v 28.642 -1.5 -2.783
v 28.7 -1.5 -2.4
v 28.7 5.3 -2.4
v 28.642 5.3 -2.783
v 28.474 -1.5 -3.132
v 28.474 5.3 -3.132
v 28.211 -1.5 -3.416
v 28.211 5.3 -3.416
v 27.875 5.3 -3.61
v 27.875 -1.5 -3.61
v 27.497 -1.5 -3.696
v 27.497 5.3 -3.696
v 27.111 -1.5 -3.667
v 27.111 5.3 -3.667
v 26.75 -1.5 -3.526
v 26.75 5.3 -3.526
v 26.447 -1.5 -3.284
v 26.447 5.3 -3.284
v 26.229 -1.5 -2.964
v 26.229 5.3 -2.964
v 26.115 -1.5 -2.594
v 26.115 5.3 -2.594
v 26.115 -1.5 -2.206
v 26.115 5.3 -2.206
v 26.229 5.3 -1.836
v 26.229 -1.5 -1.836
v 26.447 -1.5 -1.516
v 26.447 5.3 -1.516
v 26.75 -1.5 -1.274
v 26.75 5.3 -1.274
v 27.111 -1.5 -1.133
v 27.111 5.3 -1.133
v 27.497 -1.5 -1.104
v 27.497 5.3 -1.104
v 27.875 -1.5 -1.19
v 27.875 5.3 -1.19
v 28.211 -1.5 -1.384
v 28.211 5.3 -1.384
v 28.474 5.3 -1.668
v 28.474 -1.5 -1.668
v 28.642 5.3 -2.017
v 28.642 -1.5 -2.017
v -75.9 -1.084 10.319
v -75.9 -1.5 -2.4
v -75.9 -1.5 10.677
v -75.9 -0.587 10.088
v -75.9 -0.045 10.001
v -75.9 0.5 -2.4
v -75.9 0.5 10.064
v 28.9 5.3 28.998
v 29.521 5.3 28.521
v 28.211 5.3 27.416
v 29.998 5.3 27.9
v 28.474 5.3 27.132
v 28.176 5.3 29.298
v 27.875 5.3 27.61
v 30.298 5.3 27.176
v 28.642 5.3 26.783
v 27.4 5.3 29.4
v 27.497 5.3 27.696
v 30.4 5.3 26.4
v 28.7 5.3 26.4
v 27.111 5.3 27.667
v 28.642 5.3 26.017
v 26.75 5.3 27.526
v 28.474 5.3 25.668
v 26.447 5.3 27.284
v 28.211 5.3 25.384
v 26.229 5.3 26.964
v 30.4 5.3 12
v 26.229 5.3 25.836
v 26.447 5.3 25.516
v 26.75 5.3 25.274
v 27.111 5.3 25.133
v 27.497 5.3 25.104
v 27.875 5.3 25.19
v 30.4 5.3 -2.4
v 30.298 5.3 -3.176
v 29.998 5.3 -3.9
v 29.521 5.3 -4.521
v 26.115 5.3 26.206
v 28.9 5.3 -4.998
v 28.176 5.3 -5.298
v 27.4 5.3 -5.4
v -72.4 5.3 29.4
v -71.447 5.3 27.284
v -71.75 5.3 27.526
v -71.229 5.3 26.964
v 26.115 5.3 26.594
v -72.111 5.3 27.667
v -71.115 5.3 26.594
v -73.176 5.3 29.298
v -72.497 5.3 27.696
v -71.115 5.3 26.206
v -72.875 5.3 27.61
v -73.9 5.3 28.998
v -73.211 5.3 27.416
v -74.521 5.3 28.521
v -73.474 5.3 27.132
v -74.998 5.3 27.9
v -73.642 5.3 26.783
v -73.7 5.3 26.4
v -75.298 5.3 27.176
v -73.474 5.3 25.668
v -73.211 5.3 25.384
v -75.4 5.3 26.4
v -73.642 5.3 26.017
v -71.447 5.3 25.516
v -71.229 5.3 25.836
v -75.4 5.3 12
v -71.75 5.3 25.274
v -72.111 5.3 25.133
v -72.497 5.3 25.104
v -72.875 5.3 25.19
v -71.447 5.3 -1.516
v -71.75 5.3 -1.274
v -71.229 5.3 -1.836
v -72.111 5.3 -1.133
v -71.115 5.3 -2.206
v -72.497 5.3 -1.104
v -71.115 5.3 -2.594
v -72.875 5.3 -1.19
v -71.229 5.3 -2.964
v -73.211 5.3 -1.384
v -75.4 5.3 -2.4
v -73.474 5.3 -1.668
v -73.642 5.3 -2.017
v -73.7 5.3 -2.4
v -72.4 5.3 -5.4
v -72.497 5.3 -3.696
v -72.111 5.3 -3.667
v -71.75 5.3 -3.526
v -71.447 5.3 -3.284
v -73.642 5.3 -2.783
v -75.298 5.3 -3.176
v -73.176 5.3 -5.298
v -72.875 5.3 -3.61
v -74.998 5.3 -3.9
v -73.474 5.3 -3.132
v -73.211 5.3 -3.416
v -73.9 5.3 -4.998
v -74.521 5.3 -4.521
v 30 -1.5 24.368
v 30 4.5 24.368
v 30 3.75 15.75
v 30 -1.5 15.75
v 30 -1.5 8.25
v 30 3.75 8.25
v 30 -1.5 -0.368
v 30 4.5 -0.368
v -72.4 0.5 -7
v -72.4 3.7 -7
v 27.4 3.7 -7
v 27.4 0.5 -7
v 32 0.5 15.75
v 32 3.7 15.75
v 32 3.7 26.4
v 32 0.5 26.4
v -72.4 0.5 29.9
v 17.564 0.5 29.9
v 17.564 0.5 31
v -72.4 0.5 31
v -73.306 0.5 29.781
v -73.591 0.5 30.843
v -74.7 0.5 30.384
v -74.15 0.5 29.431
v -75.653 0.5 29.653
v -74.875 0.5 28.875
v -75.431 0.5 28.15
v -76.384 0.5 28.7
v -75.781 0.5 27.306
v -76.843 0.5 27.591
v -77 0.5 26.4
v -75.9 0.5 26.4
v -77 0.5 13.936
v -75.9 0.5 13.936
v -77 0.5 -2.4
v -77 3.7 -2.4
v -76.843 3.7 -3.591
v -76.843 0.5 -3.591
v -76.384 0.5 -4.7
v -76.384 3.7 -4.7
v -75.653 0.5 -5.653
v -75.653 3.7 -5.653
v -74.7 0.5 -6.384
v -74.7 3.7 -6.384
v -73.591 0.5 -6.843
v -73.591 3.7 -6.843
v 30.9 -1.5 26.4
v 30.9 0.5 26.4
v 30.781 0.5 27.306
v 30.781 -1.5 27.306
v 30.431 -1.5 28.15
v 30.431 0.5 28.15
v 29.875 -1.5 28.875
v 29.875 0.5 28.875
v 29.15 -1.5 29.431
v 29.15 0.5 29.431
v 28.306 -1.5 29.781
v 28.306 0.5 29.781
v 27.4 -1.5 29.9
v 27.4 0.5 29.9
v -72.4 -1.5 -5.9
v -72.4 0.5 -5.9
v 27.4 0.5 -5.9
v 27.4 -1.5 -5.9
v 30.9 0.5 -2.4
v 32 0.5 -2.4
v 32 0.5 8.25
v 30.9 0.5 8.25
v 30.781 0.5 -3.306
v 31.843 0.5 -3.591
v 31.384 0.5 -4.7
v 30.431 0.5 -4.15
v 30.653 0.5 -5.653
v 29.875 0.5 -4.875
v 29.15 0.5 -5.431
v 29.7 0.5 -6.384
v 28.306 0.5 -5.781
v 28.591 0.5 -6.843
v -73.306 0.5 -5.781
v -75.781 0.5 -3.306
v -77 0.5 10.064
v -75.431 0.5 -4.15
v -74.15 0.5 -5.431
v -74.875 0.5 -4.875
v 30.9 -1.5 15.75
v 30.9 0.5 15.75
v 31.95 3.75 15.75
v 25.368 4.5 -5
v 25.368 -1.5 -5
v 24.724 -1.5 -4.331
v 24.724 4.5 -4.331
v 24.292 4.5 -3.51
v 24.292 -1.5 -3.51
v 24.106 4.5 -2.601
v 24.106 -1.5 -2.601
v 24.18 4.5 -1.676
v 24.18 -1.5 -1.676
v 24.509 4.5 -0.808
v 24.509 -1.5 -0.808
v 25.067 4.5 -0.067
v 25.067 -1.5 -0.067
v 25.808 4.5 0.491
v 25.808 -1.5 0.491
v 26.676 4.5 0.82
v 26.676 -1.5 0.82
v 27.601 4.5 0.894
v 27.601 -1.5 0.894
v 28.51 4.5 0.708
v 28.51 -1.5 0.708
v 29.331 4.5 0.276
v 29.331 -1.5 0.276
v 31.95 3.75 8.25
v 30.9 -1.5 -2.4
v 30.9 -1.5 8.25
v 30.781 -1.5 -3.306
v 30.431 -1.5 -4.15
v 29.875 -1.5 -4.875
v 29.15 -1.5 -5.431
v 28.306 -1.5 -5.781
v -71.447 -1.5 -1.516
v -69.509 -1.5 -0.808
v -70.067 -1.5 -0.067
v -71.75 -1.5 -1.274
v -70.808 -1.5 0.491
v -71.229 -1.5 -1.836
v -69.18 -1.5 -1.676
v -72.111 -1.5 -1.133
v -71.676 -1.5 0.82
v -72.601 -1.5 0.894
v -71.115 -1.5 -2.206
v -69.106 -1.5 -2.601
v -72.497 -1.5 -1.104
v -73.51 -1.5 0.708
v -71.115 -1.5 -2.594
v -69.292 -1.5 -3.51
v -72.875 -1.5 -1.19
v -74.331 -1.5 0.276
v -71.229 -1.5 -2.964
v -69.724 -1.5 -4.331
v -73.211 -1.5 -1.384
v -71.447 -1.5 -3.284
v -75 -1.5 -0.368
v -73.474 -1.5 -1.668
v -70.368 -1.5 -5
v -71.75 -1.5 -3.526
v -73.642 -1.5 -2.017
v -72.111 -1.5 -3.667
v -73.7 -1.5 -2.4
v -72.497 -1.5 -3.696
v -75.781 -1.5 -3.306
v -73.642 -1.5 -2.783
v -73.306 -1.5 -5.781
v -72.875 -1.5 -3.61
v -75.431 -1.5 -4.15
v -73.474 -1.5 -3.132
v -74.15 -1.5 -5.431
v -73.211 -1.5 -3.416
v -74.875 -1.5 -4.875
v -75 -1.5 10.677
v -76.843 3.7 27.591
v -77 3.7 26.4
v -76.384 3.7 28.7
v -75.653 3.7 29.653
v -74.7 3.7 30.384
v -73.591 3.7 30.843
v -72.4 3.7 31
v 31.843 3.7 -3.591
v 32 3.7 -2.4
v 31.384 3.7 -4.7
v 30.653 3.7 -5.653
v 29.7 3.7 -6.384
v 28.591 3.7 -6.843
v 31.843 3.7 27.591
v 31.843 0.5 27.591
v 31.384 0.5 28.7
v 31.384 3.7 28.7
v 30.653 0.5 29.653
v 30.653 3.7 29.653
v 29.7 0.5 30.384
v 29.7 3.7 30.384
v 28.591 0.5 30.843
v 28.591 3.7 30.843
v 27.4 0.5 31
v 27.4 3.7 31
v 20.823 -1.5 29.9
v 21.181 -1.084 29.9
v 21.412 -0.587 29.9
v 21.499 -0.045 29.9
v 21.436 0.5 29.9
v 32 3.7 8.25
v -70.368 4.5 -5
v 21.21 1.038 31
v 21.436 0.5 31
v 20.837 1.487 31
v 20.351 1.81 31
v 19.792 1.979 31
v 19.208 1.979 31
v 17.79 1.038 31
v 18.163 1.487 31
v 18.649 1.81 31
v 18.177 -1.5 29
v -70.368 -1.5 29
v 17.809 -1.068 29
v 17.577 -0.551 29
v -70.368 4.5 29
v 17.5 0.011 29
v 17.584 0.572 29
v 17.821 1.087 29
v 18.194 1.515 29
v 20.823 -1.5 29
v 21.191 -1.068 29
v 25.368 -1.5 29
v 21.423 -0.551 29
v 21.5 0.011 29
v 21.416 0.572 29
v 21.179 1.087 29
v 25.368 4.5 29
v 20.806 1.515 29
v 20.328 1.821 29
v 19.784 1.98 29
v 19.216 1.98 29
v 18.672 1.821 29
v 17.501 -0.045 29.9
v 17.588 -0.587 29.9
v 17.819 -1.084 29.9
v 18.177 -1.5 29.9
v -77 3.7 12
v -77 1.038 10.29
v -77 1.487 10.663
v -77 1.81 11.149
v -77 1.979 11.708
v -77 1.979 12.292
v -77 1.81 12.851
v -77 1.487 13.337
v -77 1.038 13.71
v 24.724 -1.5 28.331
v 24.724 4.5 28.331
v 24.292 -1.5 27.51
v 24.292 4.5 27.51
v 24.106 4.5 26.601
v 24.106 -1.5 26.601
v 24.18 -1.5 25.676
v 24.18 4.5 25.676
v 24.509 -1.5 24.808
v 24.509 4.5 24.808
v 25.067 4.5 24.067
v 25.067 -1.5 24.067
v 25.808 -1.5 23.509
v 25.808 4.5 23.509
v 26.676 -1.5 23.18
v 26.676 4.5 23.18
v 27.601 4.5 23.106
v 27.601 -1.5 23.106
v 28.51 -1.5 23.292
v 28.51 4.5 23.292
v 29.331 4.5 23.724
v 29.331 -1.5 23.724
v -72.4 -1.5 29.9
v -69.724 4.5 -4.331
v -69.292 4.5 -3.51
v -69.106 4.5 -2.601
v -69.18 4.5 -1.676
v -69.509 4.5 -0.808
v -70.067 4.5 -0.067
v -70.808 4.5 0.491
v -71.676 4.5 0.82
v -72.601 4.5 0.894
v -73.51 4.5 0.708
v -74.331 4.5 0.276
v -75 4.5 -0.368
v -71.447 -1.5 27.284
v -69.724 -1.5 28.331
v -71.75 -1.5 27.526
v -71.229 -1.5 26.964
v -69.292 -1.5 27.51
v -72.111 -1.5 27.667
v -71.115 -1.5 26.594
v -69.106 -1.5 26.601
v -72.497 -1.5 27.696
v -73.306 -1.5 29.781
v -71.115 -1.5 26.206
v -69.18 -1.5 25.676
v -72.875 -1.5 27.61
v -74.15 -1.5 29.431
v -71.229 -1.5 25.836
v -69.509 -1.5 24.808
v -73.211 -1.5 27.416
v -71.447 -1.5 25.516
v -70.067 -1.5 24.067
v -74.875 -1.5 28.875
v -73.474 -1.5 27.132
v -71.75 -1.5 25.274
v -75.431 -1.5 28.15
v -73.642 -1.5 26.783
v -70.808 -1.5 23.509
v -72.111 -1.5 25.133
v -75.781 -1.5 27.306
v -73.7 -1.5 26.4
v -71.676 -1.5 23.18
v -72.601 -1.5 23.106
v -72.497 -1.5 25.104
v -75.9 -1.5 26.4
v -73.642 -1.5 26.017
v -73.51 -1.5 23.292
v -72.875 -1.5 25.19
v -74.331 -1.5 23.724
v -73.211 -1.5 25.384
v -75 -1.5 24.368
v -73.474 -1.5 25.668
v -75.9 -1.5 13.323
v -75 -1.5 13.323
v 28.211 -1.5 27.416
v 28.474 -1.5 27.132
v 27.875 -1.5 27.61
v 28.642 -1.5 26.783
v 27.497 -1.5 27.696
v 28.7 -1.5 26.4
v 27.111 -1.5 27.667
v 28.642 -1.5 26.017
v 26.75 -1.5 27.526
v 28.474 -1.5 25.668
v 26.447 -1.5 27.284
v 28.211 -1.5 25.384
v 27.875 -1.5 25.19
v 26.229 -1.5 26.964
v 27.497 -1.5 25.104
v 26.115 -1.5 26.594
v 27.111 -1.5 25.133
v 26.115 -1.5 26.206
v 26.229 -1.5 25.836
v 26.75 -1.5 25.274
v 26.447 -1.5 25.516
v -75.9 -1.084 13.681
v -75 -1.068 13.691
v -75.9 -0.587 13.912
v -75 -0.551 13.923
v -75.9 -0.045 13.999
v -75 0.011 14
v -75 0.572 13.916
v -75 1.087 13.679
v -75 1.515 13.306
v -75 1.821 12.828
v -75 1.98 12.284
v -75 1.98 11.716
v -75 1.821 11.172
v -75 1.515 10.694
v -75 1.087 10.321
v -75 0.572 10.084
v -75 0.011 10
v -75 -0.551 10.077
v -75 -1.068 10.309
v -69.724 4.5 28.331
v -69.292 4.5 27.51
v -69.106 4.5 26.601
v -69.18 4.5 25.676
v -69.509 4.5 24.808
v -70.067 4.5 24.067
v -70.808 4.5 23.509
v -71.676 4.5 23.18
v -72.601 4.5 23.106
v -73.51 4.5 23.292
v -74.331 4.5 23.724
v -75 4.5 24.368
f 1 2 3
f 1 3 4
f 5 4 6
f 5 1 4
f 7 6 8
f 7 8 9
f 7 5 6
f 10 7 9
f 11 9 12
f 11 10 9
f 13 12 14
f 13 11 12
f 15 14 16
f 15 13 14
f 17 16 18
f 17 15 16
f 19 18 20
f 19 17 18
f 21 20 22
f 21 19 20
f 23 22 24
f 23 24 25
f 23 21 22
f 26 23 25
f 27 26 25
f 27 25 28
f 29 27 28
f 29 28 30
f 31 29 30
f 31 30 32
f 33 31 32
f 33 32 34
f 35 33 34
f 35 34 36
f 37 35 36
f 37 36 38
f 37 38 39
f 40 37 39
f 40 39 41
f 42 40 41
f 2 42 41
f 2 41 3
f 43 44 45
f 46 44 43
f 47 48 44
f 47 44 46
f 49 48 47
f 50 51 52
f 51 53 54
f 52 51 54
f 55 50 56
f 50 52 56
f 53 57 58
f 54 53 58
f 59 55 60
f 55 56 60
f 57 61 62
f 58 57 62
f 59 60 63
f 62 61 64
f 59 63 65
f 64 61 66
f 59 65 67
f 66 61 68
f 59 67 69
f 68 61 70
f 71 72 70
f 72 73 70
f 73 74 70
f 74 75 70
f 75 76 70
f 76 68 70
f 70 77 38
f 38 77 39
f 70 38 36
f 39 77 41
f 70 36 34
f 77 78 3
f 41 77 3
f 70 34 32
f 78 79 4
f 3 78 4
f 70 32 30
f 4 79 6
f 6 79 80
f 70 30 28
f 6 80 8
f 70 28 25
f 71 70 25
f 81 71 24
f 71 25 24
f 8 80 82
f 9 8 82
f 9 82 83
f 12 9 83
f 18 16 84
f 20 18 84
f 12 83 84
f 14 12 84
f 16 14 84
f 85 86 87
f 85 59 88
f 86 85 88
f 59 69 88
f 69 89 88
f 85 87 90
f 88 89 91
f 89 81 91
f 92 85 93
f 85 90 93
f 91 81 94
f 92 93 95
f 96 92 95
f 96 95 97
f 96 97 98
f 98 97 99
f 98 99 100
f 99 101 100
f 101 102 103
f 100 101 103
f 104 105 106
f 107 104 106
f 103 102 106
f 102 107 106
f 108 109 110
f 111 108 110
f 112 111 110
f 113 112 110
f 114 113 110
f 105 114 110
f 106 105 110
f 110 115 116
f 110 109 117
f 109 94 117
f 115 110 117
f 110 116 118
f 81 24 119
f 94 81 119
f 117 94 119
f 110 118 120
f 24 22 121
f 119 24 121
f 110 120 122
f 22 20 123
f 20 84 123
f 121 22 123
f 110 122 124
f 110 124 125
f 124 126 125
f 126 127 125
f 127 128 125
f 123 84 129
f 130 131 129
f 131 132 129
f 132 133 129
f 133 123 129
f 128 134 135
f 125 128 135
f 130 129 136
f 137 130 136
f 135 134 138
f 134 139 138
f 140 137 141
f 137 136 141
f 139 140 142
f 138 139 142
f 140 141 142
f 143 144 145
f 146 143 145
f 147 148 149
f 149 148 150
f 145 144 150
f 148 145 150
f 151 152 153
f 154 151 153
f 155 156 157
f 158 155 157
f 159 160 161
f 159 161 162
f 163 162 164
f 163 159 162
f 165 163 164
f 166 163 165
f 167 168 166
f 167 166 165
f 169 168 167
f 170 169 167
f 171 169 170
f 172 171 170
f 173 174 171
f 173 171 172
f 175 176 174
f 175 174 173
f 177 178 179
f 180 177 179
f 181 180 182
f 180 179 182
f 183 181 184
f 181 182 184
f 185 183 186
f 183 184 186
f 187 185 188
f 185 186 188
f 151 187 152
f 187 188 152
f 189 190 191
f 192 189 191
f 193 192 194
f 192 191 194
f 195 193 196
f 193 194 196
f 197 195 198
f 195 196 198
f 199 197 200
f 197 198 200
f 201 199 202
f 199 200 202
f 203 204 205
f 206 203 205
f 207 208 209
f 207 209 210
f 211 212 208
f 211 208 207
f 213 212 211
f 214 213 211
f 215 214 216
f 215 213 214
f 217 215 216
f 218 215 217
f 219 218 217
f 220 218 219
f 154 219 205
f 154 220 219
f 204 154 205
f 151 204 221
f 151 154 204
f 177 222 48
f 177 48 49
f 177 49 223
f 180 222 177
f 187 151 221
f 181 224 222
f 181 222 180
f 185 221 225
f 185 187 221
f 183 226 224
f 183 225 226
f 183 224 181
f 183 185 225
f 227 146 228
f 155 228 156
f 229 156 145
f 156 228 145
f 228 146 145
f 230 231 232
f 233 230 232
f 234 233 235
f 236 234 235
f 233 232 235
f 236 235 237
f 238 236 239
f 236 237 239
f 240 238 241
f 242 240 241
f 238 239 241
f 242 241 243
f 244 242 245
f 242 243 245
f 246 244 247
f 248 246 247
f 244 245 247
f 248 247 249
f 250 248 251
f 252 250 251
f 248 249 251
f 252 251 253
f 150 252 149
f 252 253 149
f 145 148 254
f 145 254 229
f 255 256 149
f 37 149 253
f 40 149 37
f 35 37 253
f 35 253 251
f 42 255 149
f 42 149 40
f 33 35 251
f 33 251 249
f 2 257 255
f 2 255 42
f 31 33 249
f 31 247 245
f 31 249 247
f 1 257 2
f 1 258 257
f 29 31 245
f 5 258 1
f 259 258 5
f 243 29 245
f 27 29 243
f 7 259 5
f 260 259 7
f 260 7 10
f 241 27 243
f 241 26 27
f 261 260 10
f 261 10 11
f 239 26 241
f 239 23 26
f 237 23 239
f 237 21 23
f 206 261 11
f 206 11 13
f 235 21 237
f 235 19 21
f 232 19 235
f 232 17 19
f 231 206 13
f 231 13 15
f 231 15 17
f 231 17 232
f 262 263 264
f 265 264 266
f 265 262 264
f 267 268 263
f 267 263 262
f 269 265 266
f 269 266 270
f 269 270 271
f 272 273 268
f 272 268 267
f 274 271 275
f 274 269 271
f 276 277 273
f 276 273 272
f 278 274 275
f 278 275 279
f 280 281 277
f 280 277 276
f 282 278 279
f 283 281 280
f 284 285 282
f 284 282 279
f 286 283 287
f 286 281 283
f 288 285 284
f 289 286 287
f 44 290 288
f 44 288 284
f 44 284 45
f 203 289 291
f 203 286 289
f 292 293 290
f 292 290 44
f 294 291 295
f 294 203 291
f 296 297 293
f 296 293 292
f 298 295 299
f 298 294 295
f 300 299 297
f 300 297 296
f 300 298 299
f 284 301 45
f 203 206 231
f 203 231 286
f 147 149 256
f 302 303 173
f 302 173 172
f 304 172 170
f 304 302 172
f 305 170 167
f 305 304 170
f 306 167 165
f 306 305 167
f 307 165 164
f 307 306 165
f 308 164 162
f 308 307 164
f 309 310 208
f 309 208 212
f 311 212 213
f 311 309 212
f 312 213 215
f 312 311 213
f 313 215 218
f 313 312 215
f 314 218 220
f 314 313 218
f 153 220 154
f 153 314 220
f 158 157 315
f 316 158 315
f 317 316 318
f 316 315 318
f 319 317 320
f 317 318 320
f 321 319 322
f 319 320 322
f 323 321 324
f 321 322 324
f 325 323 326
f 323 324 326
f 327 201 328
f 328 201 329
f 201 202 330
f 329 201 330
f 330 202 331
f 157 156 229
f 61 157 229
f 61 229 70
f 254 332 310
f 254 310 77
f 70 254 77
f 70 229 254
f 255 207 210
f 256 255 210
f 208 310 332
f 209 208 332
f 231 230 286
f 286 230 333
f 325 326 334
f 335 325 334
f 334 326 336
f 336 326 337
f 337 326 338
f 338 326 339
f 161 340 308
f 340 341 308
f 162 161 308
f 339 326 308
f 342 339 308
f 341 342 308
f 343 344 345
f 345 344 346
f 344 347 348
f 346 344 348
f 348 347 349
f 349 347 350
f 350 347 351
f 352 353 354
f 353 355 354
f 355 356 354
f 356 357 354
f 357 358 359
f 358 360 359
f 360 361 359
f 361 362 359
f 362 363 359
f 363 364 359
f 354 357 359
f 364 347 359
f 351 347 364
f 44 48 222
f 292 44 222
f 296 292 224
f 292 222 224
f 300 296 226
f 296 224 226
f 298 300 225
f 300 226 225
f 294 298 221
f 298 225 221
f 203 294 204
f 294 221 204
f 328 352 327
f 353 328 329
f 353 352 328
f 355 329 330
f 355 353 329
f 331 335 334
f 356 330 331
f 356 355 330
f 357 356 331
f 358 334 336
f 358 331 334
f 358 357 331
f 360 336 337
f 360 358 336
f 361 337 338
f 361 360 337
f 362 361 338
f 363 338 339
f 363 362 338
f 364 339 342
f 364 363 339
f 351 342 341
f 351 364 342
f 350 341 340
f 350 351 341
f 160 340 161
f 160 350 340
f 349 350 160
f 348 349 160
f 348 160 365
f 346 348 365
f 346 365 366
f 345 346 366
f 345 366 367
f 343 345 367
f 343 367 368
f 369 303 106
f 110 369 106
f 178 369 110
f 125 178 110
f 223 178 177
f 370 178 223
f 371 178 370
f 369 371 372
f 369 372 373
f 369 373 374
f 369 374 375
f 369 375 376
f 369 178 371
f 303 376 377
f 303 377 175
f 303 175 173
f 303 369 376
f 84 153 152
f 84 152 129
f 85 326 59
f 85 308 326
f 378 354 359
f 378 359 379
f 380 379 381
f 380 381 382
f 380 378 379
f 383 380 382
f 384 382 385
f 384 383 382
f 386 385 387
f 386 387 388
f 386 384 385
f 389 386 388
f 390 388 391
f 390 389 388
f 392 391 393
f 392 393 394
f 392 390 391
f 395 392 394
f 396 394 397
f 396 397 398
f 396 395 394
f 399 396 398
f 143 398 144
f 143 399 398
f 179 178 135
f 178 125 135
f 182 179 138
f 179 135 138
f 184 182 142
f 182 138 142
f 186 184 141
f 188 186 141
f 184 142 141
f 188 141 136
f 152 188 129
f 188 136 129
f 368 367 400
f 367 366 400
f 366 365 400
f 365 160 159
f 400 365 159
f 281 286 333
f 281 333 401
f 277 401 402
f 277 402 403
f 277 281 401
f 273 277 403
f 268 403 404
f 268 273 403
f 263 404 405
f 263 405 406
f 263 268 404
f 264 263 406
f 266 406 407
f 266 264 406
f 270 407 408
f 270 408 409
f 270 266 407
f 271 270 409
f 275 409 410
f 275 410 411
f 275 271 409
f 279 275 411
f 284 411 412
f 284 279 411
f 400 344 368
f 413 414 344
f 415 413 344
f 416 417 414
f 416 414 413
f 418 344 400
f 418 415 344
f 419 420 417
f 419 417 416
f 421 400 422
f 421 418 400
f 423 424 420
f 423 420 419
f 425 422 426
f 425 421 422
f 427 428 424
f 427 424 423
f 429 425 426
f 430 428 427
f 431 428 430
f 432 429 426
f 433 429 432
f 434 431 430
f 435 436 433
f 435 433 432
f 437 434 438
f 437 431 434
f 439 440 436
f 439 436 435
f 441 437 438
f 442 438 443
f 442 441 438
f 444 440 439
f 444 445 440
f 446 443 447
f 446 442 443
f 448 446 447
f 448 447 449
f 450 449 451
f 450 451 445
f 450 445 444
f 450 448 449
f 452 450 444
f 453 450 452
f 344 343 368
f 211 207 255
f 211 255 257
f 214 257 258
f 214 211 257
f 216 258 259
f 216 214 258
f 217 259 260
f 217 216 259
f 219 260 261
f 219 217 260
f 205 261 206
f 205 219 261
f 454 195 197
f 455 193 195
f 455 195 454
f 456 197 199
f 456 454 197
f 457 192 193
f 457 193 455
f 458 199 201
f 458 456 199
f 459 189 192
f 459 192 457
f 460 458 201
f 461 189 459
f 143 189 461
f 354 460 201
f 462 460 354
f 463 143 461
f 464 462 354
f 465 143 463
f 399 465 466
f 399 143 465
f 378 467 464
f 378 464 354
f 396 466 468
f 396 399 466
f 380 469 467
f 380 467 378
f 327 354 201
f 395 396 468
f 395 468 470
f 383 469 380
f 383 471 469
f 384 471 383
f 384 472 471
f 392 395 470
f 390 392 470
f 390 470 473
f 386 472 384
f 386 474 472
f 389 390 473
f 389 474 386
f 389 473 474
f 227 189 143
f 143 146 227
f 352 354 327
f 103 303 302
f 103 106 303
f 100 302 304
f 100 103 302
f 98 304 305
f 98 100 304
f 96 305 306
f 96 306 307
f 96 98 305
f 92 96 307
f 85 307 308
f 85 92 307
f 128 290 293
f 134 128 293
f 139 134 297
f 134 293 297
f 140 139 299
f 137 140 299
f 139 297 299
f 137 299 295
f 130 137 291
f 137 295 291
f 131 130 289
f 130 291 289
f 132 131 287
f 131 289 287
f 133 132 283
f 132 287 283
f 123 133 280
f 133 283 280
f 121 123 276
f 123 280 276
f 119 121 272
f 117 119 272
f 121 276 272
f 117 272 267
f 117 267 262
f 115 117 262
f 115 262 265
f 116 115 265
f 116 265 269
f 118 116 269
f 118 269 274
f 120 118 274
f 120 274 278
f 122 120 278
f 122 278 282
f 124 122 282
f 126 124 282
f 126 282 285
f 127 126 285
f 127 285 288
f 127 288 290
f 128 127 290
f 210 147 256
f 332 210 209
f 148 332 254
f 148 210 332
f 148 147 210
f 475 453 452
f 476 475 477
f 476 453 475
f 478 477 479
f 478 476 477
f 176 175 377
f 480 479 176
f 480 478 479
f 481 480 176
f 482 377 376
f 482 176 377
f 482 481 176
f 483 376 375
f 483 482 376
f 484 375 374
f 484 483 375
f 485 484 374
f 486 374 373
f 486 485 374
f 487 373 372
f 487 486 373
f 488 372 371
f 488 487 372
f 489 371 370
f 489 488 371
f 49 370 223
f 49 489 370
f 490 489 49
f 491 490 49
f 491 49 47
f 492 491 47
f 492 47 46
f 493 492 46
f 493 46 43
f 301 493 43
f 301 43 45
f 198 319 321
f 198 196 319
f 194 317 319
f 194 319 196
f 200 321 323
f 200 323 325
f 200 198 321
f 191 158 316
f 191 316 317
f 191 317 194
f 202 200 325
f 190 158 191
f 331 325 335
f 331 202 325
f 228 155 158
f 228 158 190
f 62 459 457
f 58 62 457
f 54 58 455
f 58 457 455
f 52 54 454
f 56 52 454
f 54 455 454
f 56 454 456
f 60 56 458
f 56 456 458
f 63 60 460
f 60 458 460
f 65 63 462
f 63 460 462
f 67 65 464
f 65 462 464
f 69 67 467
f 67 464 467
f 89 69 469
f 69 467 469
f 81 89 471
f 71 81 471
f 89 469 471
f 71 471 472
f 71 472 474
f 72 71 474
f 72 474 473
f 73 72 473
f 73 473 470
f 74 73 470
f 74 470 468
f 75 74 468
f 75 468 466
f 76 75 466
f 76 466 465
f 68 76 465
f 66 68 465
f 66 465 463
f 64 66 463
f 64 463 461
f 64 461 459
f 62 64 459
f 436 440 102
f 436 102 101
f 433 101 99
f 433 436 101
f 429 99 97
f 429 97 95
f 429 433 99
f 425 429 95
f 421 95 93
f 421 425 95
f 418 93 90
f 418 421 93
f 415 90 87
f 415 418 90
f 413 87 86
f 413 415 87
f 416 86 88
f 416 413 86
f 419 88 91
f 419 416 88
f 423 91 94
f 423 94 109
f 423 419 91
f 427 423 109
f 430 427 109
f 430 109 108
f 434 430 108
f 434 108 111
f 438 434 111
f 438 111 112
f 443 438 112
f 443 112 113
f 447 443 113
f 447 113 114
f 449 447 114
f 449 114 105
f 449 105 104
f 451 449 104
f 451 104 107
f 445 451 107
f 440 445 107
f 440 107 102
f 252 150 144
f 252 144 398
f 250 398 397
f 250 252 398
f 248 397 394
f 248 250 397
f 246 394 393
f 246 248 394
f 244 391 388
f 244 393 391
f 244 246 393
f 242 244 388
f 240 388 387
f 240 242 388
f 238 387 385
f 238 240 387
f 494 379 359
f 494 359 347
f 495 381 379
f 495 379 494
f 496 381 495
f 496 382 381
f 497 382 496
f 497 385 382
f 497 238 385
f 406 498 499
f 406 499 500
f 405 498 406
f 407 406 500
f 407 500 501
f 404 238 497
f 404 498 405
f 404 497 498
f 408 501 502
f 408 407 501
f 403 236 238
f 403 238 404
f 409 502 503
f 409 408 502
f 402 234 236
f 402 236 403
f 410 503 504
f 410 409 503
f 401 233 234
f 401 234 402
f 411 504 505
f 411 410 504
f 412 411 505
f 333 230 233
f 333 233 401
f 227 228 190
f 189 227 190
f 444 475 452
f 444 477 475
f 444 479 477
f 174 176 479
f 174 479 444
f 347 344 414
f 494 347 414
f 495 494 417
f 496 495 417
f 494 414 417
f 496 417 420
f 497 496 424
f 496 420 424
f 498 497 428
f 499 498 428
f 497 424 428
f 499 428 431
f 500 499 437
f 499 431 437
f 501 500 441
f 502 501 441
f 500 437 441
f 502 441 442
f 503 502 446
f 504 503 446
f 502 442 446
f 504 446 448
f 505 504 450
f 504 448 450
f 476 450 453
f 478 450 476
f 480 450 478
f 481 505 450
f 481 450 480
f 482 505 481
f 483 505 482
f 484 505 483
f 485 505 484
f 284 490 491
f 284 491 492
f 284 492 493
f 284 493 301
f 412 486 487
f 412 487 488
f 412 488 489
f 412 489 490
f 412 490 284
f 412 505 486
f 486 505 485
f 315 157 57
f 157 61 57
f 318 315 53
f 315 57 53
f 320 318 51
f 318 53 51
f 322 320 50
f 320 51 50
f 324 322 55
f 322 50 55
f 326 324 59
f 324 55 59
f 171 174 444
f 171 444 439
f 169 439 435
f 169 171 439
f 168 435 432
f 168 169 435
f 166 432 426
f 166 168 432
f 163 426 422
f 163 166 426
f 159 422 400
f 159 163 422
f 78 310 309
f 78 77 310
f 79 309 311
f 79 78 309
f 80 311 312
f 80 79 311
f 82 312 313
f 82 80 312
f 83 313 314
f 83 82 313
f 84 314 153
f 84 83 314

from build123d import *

# Parameters (mm, degrees)
CYLINDER003_R     = 2
CYLINDER003_DEPTH = 10
CYLINDER001_R     = 2
CYLINDER001_DEPTH = 10
SKETCH037_W       = 7.5
SKETCH037_H       = 7.5
EXTRUDE045_DEPTH  = 10
SKETCH005_R       = 1.3
EXTRUDE003_DEPTH  = 20
EXTRUDE039_DEPTH  = 4
EXTRUDE042_DEPTH  = 0.8
EXTRUDE002_DEPTH  = 6
EXTRUDE037_DEPTH  = 2


with BuildPart() as shutter_cable001:
    # Cylinder003 → Cylinder003 (new body)
    with BuildSketch(Plane(origin=(19.5, 0, 24.5), x_dir=(1, 0, 0), z_dir=(0, 0, 1))):
        Circle(CYLINDER003_R)
    extrude(amount=CYLINDER003_DEPTH)


with BuildPart() as battery_cable:
    # Cylinder001 → Cylinder001 (new body)
    with BuildSketch(Plane(origin=(-70.5, 0, 12), x_dir=(0, 0, 1), z_dir=(-1, 0, 0))):
        Circle(CYLINDER001_R)
    extrude(amount=CYLINDER001_DEPTH)


with BuildPart() as common_sub:
    # Sketch037 → Extrude045 (new body)
    with BuildSketch(Plane.YZ.offset(35)):
        with Locations((0, 12)):
            Rectangle(SKETCH037_W, SKETCH037_H)
    extrude(amount=EXTRUDE045_DEPTH)


with BuildPart() as common_sub_1:
    # Extrude045 placement: moved
    add(common_sub.part.moved(Location((-9.5, 0, 0))))

    # Fusion033: union shutter cable001, battery cable
    add(shutter_cable001.part)
    add(battery_cable.part)


with BuildPart() as sweep001:
    # Sweep001: sweep along a path in Sketch034
    with BuildLine(Plane.XZ.offset(10)) as sweep001_path:
        Line((32, 12), (32, 26.4))
        ThreePointArc((32, 26.4), (30.652691, 29.652691), (27.4, 31))
        Line((27.4, 31), (-39.9, 31))
    # Sketch035 → Sweep001 (sweep)
    with BuildSketch(Plane.YZ):
        Polygon((5.3, 29.4), (3.7, 31), (3.7, 32), (6, 32), (6, 29.4), align=None)
    sweep(path=sweep001_path.line)


with BuildPart() as fusion030:
    # Sketch005 → Extrude003 (new body)
    with BuildSketch(Plane.XZ.offset(5)):
        with Locations((27.4, 26.4)):
            Circle(SKETCH005_R)
    extrude(amount=-EXTRUDE003_DEPTH)


with BuildPart() as fusion030_1:
    # Extrude003 placement: moved
    add(fusion030.part.moved(Location((0, -4, 0))))

    # Fusion030: union Sweep001
    add(sweep001.part)


with BuildPart() as top003:
    # Sketch028 → Extrude039 (new body)
    with BuildSketch(Plane.XZ.offset(10)):
        with BuildLine():
            ThreePointArc((32, 26.4), (30.652691, 29.652691), (27.4, 31))
            Line((27.4, 31), (-39.9, 31))
            Line((-39.9, 31), (-39.9, 29))
            Line((-39.9, 29), (27.4, 29))
            ThreePointArc((30, 26.4), (29.238478, 28.238478), (27.4, 29))
            Line((30, 12), (30, 26.4))
            Line((32, 12), (30, 12))
            Line((32, 26.4), (32, 12))
        make_face()
    extrude(amount=EXTRUDE039_DEPTH)


with BuildPart() as top003_1:
    # Extrude039 placement: moved
    add(top003.part.moved(Location((0, 14.5, 0))))


with BuildPart() as top002:
    # Sketch031 → Extrude042 (new body)
    with BuildSketch(Plane.XZ.offset(10)):
        with BuildLine():
            ThreePointArc((32, 26.4), (30.652691, 29.652691), (27.4, 31))
            Line((27.4, 31), (-39.9, 31))
            Line((-39.9, 31), (-39.9, 12))
            Line((-39.9, 12), (32, 12))
            Line((32, 26.4), (32, 12))
        make_face()
    extrude(amount=EXTRUDE042_DEPTH)


with BuildPart() as top002_1:
    # Extrude042 placement: moved
    add(top002.part.moved(Location((0, 15.3, 0))))


with BuildPart() as screw_hole_top:
    # Sketch004 → Extrude002 (new body)
    with BuildSketch(Plane.XZ.offset(10)):
        with BuildLine():
            ThreePointArc((25.36776, 29), (25.066548, 24.066548), (30, 24.36776))
            Line((30, 24.36776), (30, 26.4))
            ThreePointArc((30, 26.4), (29.238478, 28.238478), (27.4, 29))
            Line((25.36776, 29), (27.4, 29))
        make_face()
    extrude(amount=-EXTRUDE002_DEPTH)


with BuildPart() as screw_hole_top_1:
    # Extrude002 placement: moved
    add(screw_hole_top.part.moved(Location((0, 8.5, 0))))


with BuildPart() as top:
    # Sketch029 → Extrude037 (new body)
    with BuildSketch(Plane.XZ.offset(10)):
        with BuildLine():
            ThreePointArc((30.9, 26.4), (29.874874, 28.874874), (27.4, 29.9))
            Line((27.4, 29.9), (-22.5, 29.9))
            Line((-22.5, 29.9), (-22.5, 29))
            Line((-22.5, 29), (27.4, 29))
            ThreePointArc((30, 26.4), (29.238478, 28.238478), (27.4, 29))
            Line((30, 12), (30, 26.4))
            Line((30.9, 12), (30, 12))
            Line((30.9, 26.4), (30.9, 12))
        make_face()
    extrude(amount=EXTRUDE037_DEPTH)


with BuildPart() as top_1:
    # Extrude037 placement: moved
    add(top.part.moved(Location((0, 10.5, 0))))

    # Fusion028: union top003, top002, screw hole top
    add(top003_1.part)
    add(top002_1.part)
    add(screw_hole_top_1.part)

    # Cut024: cut Fusion030
    add(fusion030_1.part, mode=Mode.SUBTRACT)


with BuildPart() as part_mirroring:
    # Part__Mirroring: instance of top
    add(top_1.part.mirror(Plane(origin=(0, 0, 12), x_dir=(0, 1, 0), z_dir=(0, 0, 1))))


with BuildPart() as part_mirroring002:
    # Part__Mirroring002: instance of Part__Mirroring
    add(part_mirroring.part.mirror(Plane(origin=(-22.5, 1, 0), x_dir=(0, -1, 0), z_dir=(1, 0, 0))))


with BuildPart() as top007:
    # Part__Mirroring003: instance of top
    add(top_1.part.mirror(Plane(origin=(-22.5, 0, 0), x_dir=(0, -1, 0), z_dir=(1, 0, 0))))

    # Fusion032: union top, Part__Mirroring, Part__Mirroring002
    add(top_1.part)
    add(part_mirroring.part)
    add(part_mirroring002.part)

    # Cut025: cut common sub
    add(common_sub_1.part, mode=Mode.SUBTRACT)


solid = top007.part
